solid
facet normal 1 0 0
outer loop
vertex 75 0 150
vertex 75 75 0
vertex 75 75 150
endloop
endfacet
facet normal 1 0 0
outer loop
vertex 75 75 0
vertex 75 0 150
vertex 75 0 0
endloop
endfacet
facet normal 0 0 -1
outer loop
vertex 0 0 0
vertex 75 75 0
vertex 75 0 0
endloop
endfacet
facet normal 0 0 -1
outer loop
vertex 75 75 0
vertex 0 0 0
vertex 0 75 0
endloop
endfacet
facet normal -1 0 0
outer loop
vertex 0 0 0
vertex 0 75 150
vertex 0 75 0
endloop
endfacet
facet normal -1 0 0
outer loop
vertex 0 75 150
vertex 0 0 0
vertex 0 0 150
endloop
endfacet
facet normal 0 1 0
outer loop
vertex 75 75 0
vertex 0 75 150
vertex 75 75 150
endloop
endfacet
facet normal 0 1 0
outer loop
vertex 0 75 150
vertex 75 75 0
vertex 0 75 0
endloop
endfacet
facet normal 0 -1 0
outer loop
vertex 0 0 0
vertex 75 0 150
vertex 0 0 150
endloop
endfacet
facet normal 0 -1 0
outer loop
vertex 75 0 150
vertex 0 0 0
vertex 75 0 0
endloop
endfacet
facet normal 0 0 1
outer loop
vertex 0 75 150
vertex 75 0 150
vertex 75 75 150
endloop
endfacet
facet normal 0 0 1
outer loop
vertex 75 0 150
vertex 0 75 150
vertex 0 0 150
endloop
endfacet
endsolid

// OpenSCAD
lift_cover = 0; // [0:0.1:1]

/* [Hidden] */
light_strip_width = 10; // mm
light_strip_section_length = 100; // mm (~4")
light_strip_thickness = 2.5; // mm

cover_height = 110;
light_width = 75; // mm
base_height = 40; // mm

module base() {
  color("#222")
    cube([light_width, light_width, base_height]);
}

module cover() {
  color("#eee8")
    cube([light_width, light_width, cover_height]);
}

module led_strip_mount() {
  color("#eee8")
    cube([light_width - 20, light_width - 20, cover_height - 20]);
}

base();

translate([0, 0, base_height + (cover_height * lift_cover)])
  cover();

translate([10, 10, base_height])
  led_strip_mount();
